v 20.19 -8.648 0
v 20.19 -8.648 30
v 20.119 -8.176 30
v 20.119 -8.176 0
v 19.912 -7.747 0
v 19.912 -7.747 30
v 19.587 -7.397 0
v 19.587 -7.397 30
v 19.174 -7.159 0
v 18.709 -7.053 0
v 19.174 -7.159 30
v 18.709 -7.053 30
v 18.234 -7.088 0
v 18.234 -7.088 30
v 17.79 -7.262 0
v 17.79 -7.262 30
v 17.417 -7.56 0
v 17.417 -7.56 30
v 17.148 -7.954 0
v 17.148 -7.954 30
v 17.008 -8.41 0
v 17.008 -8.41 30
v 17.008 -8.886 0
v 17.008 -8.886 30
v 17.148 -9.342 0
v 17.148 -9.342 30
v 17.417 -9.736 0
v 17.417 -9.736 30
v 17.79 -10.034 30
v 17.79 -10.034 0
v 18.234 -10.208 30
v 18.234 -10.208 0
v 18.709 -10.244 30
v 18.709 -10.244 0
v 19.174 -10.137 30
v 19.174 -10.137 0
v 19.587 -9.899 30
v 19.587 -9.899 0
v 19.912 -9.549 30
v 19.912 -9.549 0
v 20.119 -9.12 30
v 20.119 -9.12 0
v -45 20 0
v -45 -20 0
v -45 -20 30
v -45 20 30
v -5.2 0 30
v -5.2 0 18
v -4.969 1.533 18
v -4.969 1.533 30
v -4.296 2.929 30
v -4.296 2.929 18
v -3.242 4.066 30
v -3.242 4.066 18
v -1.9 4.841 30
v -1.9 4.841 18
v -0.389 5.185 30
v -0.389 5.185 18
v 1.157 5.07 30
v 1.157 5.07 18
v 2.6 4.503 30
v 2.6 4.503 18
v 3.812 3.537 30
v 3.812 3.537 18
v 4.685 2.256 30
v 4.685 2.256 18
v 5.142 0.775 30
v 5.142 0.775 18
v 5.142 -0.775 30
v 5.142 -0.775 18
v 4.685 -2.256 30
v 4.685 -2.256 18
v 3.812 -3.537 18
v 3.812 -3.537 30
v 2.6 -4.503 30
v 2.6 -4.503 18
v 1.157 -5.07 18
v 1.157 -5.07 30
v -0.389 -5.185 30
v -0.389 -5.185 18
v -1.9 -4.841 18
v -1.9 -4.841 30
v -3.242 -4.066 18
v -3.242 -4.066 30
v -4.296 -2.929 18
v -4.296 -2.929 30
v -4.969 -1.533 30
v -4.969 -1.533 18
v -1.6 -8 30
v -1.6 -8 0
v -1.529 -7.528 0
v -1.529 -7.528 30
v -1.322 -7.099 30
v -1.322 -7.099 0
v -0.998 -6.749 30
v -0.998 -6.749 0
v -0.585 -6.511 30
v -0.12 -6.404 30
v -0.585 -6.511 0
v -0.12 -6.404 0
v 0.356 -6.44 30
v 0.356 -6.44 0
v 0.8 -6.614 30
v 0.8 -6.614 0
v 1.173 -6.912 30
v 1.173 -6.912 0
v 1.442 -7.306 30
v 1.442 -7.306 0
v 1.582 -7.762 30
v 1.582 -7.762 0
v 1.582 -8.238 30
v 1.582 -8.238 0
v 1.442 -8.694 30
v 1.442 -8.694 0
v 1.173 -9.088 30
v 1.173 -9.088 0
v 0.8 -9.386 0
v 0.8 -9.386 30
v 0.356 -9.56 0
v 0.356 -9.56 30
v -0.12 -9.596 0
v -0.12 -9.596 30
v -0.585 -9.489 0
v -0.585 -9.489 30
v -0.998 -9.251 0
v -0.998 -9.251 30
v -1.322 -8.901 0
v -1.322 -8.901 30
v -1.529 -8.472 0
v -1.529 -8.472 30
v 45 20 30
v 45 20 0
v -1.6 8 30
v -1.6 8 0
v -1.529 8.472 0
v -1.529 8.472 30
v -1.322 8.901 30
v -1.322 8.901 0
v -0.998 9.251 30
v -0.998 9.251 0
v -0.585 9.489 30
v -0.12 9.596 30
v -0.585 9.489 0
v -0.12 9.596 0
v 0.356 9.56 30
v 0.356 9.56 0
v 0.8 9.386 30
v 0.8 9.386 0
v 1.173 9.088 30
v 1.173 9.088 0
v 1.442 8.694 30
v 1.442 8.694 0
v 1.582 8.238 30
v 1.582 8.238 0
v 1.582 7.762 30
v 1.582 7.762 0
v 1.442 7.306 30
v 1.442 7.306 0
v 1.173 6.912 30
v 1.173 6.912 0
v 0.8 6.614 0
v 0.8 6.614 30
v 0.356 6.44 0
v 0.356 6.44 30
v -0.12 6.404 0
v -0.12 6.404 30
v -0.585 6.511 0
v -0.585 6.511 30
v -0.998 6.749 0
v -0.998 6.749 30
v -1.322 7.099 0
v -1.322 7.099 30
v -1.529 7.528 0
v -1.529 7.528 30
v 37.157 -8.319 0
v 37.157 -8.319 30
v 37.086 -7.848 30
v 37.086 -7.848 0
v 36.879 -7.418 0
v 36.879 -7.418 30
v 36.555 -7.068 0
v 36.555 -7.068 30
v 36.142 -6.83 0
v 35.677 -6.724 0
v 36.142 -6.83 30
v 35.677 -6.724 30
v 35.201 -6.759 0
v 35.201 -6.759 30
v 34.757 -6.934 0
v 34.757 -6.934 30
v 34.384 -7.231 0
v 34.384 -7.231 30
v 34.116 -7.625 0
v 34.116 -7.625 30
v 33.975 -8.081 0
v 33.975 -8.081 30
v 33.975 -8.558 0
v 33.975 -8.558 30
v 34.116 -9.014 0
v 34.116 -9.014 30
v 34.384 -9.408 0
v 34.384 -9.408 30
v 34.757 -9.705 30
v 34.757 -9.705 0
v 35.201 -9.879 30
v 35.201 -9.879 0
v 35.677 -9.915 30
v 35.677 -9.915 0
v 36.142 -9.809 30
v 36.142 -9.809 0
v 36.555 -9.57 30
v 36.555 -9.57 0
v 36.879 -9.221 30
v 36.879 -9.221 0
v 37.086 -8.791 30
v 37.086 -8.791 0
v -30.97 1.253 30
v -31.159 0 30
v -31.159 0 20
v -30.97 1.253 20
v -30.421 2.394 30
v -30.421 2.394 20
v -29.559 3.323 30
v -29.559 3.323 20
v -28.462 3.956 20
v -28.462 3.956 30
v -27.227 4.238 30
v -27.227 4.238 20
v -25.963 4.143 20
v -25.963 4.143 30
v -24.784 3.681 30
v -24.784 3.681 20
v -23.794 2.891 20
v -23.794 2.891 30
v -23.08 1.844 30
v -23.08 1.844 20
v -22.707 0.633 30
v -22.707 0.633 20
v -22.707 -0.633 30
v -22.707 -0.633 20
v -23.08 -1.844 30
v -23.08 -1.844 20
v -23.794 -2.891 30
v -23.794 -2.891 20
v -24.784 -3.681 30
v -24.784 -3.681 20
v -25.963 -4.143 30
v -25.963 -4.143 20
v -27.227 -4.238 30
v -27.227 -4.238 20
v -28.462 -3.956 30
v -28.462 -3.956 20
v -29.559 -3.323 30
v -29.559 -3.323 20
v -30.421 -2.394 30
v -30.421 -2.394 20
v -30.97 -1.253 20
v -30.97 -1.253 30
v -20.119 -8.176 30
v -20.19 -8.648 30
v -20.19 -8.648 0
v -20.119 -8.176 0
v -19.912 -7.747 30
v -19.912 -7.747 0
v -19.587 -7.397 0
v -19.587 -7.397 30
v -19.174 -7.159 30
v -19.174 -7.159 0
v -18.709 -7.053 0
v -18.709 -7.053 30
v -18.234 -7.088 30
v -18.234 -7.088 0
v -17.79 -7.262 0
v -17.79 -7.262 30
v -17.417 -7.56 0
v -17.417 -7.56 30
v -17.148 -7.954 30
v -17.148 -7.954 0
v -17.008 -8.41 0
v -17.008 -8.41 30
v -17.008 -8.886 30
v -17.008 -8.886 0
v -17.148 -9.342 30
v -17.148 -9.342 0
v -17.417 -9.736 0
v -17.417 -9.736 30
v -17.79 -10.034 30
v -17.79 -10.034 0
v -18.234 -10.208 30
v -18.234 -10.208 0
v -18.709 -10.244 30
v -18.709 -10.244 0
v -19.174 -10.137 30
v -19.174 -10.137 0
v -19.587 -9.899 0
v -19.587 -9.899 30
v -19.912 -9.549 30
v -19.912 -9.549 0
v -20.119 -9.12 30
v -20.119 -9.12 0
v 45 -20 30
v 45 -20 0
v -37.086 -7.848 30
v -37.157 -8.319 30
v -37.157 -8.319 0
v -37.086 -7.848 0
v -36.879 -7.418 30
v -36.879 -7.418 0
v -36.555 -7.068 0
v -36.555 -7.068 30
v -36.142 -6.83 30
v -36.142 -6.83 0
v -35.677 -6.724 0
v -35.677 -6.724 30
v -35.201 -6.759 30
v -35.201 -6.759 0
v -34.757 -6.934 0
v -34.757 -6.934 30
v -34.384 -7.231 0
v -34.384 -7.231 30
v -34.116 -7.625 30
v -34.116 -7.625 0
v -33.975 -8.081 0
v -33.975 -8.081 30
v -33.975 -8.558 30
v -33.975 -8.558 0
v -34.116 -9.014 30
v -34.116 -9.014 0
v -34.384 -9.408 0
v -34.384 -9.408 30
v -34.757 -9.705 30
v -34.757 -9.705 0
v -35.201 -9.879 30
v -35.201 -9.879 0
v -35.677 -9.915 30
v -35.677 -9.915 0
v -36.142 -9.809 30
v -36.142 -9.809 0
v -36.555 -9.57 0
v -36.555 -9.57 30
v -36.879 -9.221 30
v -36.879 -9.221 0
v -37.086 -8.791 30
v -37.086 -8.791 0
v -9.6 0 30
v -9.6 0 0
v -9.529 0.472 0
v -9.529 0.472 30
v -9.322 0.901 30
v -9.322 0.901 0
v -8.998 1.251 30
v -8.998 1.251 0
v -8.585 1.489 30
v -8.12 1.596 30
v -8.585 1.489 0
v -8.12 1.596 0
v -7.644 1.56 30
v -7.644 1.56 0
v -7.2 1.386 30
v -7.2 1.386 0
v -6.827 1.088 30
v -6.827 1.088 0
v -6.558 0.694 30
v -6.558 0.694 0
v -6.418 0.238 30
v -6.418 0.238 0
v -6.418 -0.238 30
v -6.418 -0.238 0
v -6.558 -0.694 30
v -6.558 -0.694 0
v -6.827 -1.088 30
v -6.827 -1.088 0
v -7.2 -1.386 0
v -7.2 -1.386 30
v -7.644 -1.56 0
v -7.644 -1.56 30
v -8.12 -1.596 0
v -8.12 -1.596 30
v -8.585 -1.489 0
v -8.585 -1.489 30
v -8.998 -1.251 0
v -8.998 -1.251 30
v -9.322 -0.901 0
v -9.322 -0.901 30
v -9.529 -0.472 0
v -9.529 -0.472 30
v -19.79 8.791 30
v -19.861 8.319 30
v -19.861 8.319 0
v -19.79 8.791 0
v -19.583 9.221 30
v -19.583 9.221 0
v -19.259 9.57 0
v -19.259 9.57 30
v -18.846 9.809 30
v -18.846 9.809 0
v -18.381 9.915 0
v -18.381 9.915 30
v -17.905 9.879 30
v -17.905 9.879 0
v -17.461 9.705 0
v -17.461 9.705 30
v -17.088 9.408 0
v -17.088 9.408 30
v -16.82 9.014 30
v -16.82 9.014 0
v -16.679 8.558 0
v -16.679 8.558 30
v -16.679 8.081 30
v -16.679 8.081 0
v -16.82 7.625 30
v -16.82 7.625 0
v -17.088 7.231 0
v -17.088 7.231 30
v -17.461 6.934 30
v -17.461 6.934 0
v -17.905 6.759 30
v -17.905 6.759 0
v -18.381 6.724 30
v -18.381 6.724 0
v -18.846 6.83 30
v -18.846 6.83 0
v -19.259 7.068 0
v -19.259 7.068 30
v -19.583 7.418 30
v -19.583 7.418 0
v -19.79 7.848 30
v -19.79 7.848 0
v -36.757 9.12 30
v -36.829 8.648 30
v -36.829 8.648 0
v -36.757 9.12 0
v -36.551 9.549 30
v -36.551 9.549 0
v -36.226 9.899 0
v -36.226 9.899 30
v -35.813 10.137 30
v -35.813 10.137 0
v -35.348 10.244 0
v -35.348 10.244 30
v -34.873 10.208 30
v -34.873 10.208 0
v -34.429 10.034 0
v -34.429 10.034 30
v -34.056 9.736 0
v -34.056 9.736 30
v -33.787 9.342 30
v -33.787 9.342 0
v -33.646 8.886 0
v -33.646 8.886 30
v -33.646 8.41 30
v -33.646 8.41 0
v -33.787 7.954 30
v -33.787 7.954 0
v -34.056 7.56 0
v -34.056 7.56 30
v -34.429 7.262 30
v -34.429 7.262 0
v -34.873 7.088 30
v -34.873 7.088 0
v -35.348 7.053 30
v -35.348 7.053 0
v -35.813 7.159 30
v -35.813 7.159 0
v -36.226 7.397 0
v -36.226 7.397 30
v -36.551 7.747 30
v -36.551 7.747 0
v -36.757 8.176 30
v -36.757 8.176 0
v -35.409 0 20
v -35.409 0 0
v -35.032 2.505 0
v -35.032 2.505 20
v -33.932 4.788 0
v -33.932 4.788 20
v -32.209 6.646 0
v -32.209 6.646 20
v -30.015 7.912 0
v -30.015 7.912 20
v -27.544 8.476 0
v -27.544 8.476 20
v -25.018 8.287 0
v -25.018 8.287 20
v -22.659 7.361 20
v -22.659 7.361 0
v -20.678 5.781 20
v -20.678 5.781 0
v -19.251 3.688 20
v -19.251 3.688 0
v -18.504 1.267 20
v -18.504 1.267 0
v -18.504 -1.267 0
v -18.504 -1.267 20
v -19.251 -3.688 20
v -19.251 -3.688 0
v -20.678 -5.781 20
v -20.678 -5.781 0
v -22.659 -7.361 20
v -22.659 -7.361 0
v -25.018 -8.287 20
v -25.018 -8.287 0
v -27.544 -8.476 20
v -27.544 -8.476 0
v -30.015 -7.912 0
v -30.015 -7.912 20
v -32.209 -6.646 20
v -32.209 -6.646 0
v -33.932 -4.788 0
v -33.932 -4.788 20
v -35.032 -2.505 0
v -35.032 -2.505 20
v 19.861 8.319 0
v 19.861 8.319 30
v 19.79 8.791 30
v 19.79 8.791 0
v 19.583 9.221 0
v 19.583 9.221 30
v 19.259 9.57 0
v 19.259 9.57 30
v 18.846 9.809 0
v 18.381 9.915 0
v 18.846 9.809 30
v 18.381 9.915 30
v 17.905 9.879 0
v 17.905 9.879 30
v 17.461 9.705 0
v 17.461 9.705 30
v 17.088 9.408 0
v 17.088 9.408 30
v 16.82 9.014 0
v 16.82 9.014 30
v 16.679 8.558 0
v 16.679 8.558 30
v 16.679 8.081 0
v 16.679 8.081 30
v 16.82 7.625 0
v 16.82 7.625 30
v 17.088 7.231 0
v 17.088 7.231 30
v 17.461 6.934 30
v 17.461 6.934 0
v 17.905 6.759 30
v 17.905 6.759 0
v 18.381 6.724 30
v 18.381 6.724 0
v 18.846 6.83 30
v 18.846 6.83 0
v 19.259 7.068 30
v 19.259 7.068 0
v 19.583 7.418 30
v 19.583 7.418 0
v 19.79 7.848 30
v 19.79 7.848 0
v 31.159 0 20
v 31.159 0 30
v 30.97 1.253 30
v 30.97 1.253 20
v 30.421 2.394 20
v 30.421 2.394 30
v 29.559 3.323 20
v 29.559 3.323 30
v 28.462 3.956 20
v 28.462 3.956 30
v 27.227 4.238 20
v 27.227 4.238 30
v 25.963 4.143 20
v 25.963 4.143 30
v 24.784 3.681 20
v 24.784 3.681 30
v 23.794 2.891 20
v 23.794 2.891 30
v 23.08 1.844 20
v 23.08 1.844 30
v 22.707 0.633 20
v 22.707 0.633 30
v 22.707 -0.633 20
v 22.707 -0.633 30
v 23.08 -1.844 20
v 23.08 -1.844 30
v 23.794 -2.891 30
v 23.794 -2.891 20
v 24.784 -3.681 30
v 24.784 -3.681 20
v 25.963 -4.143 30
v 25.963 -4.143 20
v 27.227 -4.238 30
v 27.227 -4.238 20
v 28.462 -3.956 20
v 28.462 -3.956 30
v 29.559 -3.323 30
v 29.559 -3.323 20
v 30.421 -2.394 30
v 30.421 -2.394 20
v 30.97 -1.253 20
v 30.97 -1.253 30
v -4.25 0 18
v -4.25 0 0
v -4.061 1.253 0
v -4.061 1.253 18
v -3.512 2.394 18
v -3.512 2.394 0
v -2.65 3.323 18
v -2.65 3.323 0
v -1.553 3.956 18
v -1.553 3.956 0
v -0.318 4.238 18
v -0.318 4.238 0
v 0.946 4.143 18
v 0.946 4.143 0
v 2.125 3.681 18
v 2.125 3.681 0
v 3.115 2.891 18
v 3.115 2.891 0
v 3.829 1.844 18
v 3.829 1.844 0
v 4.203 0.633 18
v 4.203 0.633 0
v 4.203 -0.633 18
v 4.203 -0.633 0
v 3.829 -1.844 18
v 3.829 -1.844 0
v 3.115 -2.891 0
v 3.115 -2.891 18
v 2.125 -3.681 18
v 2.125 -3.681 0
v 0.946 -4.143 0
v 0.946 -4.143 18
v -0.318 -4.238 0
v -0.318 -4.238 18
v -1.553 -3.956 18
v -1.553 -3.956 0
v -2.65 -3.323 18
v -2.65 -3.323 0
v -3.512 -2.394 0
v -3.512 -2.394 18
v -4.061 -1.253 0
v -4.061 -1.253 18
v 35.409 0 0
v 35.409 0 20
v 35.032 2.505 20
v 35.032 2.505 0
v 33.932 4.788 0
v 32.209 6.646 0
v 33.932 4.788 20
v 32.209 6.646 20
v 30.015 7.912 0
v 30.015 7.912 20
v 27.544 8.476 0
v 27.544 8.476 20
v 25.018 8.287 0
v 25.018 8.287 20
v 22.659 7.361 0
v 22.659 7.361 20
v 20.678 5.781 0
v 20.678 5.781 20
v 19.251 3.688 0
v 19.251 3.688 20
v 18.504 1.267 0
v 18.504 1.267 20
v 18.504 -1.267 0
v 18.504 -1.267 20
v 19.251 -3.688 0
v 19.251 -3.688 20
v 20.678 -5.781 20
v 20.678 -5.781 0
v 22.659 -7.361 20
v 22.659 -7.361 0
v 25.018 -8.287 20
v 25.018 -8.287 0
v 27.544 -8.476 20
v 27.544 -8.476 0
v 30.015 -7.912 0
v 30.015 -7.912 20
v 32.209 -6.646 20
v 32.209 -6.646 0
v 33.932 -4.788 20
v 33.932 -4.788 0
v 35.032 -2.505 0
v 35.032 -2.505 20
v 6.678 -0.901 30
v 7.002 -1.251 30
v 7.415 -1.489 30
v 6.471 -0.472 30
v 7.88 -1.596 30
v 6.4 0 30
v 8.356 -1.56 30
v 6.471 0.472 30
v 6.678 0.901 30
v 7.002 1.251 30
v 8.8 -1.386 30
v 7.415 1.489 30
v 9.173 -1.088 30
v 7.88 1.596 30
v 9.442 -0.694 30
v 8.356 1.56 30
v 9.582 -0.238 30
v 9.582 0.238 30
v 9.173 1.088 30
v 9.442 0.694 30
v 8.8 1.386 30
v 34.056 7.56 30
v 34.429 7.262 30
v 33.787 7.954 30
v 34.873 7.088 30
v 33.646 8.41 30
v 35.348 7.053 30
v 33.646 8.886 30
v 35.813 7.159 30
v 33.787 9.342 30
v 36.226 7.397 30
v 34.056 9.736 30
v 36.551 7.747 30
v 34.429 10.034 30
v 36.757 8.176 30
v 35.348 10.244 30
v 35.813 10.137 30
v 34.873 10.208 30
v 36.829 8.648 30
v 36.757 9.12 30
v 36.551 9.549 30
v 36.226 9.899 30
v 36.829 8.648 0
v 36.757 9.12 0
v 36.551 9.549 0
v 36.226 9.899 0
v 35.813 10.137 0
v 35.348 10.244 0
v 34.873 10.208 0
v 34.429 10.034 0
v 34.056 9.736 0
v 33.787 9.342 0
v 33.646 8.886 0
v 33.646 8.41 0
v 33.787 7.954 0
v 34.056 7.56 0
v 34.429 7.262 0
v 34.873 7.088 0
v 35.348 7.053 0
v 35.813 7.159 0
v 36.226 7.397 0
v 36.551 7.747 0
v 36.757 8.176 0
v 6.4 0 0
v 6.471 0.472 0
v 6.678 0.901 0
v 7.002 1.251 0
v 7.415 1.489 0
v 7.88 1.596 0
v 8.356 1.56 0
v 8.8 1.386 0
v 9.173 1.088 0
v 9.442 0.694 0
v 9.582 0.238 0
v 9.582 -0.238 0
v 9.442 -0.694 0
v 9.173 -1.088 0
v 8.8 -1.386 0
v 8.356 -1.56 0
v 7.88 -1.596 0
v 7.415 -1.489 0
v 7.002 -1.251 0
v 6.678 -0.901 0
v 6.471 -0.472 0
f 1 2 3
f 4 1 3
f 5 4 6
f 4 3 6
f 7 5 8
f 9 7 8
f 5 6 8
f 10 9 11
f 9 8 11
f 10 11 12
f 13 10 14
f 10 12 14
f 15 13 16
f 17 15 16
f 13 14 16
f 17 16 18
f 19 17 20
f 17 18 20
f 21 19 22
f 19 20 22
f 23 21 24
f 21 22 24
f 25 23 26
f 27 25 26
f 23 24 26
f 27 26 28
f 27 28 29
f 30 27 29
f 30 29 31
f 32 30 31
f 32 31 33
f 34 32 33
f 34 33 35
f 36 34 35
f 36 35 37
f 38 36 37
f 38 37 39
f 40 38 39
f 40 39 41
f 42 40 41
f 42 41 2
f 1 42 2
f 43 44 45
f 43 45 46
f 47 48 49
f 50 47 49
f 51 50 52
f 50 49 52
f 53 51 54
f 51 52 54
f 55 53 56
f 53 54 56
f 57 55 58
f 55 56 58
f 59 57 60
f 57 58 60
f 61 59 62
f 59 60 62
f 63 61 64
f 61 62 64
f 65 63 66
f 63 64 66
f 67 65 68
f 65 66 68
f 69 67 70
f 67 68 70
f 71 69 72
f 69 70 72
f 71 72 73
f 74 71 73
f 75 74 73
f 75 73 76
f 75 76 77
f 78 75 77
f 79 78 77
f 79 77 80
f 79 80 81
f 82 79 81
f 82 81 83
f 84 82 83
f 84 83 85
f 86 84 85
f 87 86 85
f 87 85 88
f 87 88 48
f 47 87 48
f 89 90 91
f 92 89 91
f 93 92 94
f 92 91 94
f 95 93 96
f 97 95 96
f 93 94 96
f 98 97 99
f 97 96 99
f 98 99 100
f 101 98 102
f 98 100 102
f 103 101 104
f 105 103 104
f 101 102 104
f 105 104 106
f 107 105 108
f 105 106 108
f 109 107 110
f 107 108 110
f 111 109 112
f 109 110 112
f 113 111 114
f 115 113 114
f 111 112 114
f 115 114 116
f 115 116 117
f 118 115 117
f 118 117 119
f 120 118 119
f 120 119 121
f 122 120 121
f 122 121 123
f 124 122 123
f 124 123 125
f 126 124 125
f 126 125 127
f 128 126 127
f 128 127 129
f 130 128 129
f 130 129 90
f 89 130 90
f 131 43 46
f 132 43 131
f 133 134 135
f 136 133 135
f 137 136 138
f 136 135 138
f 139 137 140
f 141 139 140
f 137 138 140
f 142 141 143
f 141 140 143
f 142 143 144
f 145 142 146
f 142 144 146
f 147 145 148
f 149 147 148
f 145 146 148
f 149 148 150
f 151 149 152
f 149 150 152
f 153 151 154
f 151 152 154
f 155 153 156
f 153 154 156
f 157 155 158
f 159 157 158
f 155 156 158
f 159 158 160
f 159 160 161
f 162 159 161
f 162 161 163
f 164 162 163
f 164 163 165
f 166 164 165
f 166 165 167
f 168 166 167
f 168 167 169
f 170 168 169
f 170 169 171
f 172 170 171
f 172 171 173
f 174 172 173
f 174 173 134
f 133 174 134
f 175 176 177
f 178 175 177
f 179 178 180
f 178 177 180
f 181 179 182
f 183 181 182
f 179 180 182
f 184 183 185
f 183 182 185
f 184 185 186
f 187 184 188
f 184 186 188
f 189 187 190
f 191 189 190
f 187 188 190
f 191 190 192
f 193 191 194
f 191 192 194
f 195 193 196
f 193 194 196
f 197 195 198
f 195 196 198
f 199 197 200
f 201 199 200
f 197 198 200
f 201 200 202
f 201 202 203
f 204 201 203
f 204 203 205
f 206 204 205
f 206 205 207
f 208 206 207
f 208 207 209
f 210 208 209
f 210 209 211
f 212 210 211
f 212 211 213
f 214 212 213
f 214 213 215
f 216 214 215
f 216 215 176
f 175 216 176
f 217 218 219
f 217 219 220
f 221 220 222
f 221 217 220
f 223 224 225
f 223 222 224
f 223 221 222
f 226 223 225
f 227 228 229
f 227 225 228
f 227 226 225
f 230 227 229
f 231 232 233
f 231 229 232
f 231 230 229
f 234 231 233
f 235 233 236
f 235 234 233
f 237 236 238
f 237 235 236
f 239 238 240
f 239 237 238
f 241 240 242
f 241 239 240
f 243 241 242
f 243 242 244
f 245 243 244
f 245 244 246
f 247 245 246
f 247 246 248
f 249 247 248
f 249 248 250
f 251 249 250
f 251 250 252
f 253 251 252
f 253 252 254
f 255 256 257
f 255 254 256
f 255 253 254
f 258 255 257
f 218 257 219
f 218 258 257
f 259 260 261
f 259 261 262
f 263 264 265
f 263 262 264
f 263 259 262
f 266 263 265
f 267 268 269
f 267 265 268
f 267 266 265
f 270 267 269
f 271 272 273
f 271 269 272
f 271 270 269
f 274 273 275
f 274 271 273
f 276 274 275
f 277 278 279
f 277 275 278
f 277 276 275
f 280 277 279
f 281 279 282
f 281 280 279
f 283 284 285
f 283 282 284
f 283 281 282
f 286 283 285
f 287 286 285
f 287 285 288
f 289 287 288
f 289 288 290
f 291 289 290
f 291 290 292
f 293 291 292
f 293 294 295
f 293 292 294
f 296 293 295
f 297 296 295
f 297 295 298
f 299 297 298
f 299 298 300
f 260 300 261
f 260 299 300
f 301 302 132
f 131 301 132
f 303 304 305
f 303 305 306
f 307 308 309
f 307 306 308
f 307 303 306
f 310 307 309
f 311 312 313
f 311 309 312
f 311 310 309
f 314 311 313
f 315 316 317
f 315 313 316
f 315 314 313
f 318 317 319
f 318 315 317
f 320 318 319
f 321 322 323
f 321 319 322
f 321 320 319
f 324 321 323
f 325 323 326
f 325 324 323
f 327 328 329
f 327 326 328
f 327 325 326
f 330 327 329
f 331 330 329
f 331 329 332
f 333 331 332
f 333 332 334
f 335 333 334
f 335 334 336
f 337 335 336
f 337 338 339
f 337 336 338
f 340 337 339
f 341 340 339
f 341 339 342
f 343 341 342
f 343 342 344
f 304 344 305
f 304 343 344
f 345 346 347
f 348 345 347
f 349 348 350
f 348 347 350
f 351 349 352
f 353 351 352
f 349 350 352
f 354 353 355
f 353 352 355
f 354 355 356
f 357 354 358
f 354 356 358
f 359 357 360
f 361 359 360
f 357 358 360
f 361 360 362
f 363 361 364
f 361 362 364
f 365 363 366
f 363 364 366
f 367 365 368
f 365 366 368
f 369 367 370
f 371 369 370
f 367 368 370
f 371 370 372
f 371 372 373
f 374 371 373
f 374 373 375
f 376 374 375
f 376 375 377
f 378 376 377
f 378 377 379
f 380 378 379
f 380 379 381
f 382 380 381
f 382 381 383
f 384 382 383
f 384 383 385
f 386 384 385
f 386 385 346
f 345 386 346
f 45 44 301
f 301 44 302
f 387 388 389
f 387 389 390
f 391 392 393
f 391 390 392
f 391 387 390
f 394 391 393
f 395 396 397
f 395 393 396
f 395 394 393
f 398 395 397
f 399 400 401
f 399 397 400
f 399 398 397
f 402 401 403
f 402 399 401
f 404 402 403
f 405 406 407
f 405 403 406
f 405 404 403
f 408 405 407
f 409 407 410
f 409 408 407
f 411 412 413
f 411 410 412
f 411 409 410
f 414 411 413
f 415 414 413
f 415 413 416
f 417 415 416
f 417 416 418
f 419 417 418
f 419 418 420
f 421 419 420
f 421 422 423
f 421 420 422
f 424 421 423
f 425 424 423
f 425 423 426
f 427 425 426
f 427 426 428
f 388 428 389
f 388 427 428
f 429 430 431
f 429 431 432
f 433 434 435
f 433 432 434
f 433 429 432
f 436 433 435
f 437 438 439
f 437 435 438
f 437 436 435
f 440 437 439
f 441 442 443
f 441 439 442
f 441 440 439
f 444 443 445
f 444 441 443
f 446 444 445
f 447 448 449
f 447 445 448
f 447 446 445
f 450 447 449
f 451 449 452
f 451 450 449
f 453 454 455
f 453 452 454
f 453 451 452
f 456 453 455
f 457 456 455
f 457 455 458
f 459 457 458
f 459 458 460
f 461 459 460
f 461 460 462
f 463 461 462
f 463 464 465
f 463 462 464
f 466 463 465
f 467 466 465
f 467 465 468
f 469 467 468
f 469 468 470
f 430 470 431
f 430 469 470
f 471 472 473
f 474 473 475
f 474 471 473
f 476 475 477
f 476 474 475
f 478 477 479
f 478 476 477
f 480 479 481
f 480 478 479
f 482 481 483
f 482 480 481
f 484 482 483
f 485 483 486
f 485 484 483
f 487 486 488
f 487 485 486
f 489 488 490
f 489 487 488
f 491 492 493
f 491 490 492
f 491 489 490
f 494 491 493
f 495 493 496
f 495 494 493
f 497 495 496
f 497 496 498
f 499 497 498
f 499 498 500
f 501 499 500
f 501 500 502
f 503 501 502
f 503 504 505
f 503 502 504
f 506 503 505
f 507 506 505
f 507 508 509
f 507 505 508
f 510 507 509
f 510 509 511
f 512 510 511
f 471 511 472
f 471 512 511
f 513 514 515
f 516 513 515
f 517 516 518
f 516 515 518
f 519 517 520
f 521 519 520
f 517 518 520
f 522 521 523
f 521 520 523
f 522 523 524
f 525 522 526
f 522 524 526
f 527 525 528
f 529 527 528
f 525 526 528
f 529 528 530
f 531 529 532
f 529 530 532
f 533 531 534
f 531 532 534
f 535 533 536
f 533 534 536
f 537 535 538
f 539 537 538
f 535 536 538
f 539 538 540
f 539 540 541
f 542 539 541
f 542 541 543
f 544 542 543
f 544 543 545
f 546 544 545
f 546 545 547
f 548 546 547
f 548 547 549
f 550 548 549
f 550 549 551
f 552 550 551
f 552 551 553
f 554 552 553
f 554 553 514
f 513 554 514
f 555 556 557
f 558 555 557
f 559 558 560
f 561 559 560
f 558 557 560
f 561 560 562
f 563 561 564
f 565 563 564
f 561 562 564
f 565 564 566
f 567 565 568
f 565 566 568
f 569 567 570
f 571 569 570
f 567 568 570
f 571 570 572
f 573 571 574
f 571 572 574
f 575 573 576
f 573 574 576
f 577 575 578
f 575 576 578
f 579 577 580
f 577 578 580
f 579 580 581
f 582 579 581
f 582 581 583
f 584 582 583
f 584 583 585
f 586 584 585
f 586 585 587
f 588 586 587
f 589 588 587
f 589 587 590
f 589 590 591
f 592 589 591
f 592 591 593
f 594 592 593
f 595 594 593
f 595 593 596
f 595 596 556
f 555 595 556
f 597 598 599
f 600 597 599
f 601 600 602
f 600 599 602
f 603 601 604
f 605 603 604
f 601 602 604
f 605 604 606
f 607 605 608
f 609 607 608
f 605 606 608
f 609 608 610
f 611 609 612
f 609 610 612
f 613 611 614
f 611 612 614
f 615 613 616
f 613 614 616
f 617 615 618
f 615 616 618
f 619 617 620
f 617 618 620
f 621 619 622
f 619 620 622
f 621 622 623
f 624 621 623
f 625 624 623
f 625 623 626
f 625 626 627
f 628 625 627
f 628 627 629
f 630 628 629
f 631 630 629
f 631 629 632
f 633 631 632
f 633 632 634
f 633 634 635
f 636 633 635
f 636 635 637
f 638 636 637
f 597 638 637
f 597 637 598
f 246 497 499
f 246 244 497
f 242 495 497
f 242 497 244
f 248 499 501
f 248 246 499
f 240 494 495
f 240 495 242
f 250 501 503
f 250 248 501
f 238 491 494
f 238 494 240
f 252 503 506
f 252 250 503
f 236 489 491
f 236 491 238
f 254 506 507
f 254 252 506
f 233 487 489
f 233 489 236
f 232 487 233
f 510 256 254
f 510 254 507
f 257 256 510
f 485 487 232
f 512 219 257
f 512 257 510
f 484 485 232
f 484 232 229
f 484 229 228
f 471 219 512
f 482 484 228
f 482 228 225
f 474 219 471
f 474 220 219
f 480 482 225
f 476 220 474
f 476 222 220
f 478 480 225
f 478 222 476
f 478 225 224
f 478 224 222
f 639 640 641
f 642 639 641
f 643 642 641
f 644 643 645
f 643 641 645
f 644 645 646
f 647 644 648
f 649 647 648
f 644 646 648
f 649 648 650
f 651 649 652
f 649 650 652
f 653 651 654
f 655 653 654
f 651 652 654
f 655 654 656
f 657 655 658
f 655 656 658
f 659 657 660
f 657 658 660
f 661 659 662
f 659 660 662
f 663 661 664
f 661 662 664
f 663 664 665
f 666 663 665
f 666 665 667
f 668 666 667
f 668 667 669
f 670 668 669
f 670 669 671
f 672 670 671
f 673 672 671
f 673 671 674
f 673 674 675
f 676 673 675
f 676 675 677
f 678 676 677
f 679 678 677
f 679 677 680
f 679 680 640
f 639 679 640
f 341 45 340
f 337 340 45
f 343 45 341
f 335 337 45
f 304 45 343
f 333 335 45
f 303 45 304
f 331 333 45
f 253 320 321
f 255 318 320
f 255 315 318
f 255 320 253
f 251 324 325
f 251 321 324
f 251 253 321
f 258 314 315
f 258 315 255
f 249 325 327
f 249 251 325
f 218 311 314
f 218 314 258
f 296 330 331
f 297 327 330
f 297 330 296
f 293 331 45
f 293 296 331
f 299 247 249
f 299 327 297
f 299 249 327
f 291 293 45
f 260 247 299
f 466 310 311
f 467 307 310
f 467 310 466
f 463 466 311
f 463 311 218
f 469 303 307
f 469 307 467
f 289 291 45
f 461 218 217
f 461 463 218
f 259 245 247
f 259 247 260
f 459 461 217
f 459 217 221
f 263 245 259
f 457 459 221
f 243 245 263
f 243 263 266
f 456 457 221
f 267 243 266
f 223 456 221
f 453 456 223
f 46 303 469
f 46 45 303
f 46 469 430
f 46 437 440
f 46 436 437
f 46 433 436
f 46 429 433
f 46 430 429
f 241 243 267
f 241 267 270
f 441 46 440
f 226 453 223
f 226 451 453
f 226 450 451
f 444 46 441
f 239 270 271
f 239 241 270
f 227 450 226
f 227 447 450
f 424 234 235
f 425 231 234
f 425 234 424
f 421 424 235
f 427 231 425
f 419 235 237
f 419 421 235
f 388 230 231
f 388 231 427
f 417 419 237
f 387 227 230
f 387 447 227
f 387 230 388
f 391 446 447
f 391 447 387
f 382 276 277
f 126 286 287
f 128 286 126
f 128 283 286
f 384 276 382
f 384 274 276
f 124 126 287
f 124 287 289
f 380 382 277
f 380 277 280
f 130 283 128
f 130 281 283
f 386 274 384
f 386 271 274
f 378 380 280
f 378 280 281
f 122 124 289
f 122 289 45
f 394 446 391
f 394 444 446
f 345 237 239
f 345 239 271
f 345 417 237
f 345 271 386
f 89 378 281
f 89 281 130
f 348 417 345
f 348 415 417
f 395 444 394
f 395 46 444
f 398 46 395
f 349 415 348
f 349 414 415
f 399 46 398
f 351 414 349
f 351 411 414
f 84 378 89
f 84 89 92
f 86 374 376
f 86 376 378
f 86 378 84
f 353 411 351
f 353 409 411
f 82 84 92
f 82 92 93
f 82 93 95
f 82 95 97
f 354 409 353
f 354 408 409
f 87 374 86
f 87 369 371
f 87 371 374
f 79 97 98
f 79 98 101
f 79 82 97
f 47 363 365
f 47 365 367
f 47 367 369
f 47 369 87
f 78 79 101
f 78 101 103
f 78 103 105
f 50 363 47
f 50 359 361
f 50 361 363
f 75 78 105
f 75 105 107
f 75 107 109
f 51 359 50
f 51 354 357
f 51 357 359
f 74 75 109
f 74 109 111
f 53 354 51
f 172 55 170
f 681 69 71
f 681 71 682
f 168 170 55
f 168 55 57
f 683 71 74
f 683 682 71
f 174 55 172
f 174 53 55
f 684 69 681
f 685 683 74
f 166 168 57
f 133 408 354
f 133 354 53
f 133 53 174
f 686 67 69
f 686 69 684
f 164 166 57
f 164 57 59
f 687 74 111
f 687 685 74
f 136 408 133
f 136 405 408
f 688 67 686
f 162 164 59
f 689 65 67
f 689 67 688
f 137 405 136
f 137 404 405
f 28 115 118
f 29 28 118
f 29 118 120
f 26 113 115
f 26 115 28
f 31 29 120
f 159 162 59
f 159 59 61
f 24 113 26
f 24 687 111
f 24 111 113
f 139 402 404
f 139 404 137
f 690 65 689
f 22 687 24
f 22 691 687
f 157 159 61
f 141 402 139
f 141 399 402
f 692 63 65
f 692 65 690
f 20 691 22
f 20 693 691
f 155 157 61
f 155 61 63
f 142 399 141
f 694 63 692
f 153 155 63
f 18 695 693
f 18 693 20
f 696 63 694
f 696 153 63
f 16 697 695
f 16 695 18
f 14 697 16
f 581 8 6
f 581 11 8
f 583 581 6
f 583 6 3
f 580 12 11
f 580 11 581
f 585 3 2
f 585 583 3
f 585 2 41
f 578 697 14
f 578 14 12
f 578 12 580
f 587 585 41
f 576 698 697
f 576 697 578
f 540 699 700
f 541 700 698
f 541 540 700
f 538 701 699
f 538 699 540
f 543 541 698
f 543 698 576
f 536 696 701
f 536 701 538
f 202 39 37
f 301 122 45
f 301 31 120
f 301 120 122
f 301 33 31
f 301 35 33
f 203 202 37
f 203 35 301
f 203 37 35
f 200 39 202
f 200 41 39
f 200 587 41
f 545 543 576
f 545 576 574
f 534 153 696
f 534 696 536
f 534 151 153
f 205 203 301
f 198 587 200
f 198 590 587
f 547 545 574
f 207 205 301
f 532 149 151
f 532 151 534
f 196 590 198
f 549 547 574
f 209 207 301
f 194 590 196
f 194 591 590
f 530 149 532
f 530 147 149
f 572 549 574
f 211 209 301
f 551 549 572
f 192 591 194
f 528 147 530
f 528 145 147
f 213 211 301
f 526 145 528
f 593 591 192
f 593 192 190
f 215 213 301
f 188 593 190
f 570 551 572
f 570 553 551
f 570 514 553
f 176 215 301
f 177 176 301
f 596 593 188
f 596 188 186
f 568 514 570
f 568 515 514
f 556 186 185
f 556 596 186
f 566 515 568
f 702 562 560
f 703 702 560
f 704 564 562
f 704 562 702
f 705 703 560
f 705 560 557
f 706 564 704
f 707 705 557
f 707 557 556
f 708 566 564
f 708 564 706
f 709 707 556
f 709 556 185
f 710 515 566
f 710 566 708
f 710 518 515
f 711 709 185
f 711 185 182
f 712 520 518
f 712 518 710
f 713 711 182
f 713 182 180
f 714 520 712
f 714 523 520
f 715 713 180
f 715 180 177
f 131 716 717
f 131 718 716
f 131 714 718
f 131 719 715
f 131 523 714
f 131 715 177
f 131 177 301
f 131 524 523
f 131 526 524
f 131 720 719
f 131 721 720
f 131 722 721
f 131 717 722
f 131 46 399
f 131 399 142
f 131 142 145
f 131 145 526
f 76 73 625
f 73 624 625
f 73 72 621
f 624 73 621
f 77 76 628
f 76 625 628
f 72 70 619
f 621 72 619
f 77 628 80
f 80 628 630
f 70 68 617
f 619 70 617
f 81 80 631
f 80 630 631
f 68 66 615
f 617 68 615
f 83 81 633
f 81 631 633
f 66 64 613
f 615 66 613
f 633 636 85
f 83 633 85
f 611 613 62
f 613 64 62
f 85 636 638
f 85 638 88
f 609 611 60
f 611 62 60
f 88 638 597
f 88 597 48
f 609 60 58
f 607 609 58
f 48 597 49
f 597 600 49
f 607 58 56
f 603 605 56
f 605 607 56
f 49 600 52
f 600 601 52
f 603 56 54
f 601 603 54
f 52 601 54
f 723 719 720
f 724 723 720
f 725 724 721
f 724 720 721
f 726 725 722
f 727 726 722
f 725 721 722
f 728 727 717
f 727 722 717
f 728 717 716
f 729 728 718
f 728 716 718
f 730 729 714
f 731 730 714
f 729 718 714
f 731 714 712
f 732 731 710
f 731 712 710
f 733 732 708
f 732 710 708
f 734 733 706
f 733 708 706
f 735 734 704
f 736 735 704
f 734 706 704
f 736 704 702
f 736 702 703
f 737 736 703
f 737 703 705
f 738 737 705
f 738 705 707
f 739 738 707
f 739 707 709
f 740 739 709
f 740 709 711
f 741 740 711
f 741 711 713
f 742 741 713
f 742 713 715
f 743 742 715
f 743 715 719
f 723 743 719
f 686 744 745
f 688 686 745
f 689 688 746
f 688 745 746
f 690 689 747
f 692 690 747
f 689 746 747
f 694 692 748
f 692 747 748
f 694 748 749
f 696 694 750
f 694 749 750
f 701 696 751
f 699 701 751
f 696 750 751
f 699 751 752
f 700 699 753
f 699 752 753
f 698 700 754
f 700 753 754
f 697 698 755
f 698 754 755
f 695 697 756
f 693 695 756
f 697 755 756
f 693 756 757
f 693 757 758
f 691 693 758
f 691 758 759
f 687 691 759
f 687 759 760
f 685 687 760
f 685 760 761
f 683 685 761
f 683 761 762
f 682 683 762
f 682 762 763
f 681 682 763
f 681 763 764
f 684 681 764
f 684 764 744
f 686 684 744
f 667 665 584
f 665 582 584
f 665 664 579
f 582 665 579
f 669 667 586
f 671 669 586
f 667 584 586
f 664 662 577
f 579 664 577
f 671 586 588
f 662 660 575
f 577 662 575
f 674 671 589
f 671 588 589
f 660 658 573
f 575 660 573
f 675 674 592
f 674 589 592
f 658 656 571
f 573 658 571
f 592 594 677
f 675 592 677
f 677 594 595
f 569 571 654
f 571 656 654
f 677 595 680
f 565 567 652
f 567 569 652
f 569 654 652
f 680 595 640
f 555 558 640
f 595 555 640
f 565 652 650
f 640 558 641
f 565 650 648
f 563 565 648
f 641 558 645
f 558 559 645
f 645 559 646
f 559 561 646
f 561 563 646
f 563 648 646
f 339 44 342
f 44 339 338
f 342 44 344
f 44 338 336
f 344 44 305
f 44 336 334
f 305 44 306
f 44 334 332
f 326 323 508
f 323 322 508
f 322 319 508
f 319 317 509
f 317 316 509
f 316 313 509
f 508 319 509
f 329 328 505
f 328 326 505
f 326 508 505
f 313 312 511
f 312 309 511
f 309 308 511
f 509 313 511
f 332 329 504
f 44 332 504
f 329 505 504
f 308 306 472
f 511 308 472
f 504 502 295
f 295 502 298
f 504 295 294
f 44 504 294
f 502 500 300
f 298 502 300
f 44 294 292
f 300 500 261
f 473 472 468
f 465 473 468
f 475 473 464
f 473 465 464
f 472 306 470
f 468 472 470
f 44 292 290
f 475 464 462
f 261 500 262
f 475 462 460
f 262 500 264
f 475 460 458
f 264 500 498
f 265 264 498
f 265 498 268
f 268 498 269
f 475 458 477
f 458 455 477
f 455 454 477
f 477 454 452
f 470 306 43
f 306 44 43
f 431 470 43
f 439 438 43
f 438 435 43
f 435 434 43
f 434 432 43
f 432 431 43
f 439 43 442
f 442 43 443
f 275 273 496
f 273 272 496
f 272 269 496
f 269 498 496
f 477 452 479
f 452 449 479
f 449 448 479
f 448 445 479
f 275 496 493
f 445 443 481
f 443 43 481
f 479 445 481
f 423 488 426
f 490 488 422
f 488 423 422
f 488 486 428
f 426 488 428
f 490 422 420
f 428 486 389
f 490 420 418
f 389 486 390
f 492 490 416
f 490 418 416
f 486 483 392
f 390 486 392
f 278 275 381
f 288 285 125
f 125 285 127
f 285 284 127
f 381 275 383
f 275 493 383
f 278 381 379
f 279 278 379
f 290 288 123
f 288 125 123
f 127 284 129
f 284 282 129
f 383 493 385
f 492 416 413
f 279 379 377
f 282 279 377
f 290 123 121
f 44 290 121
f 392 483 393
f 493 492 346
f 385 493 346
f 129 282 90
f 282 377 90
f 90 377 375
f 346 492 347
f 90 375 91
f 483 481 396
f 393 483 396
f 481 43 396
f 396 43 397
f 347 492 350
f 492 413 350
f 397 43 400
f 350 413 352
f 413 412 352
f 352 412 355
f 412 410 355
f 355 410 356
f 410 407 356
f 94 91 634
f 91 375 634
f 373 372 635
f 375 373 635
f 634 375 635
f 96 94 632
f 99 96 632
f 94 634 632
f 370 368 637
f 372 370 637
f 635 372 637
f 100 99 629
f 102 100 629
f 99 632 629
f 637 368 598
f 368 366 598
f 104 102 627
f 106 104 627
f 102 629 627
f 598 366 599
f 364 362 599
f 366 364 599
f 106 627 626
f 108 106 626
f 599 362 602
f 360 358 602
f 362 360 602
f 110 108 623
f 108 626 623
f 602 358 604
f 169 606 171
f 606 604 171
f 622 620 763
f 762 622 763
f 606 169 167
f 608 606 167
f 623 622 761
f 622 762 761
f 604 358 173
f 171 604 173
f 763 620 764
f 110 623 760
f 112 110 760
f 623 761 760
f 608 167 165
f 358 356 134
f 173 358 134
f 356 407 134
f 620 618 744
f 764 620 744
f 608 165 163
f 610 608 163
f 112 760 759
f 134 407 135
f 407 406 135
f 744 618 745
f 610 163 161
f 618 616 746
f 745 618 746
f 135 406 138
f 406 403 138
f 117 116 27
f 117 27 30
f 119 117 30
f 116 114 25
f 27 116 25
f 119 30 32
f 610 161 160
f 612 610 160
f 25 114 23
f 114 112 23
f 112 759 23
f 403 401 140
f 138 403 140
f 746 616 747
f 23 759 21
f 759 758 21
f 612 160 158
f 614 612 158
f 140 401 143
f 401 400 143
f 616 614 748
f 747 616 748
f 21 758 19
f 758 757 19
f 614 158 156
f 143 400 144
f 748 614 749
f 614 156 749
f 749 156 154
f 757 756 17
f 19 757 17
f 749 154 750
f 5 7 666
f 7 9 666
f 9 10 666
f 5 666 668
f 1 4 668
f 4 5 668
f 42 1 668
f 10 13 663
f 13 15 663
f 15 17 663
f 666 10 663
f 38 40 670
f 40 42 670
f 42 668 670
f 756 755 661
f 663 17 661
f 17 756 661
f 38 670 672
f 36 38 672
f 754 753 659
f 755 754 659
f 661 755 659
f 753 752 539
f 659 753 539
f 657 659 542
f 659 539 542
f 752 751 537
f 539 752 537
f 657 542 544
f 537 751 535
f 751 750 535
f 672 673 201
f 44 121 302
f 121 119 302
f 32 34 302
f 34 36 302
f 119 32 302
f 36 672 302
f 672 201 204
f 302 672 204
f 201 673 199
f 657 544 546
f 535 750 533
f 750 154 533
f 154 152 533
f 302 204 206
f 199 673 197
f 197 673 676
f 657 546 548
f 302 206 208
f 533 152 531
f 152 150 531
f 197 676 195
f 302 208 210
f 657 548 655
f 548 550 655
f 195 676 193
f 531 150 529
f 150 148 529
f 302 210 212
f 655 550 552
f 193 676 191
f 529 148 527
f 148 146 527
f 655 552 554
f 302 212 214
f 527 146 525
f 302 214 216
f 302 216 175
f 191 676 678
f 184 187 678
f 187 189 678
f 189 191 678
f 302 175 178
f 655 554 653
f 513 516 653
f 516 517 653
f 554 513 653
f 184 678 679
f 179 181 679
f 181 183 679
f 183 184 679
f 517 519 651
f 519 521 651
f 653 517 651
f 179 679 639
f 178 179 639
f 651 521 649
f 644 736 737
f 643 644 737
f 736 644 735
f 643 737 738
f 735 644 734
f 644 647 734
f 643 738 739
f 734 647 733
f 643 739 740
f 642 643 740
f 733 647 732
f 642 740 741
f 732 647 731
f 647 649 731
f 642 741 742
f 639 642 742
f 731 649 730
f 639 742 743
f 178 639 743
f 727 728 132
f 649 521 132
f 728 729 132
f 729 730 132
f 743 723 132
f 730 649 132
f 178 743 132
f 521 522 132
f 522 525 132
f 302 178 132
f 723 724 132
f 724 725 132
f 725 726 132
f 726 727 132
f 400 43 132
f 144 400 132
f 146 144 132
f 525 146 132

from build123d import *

# Parameters (mm, degrees)
SKETCH_1_W            = 90
SKETCH_1_H            = 40
EXTRUDE_1_DEPTH       = 30
HOLE_WIZARD_356_D     = 8.5
HOLE_WIZARD_461_D     = 10.4
HOLE_WIZARD_461_DEPTH = 12
HOLE_WIZARD_561_D     = 3.2
HOLE_WIZARD_727_D     = 8.5
HOLE_WIZARD_831_D     = 3.2
HOLE_WIZARD_989_D     = 17
HOLE_WIZARD_989_DEPTH = 20


with BuildPart() as part:
    # 草图1 → 凸台-拉伸1 (new body)
    with BuildSketch(Plane.XY):
        Rectangle(SKETCH_1_W, SKETCH_1_H)
    extrude(amount=EXTRUDE_1_DEPTH)

    # Hole Wizard 356 (through all)
    with Locations(Plane.XY.offset(30)):
        with Locations((0, 0)):
            Hole(HOLE_WIZARD_356_D / 2)

    # Hole Wizard 461
    with Locations(Plane.XY.offset(30)):
        with Locations((0, 0)):
            Hole(HOLE_WIZARD_461_D / 2, depth=HOLE_WIZARD_461_DEPTH)

    # Hole Wizard 561 (through all)
    with Locations(Plane.XY.offset(30)):
        with Locations((8, 0), (0, 8), (-8, 0), (0, -8)):
            Hole(HOLE_WIZARD_561_D / 2)

    # Hole Wizard 727 (through all)
    with Locations(Plane(origin=(0, 0, 0), x_dir=(-1, 0, 0), z_dir=(0, 0, -1))):
        with Locations((-26.909213315, 0)):
            hole_wizard_727 = Hole(HOLE_WIZARD_727_D / 2)

    # Hole Wizard 831 (through all)
    with Locations(Plane(origin=(0, 0, 0), x_dir=(-1, 0, 0), z_dir=(0, 0, -1))):
        with Locations((-18.261181521, 8.319347696), (-35.228561011, 8.648031794), (-35.557245109, -8.319347696), (-18.589865619, -8.648031794)):
            hole_wizard_831 = Hole(HOLE_WIZARD_831_D / 2)

    # Hole Wizard 989
    with Locations(Plane(origin=(0, 0, 0), x_dir=(-1, 0, 0), z_dir=(0, 0, -1))):
        with Locations((-26.909213315, 0)):
            hole_wizard_989 = Hole(HOLE_WIZARD_989_D / 2, depth=HOLE_WIZARD_989_DEPTH)

    # 镜向1: Hole Wizard 727, Hole Wizard 831, Hole Wizard 989 across plane
    add(hole_wizard_727.mirror(Plane.ZY), mode=Mode.SUBTRACT)
    add(hole_wizard_831.mirror(Plane.ZY), mode=Mode.SUBTRACT)
    add(hole_wizard_989.mirror(Plane.ZY), mode=Mode.SUBTRACT)


solid = part.part
